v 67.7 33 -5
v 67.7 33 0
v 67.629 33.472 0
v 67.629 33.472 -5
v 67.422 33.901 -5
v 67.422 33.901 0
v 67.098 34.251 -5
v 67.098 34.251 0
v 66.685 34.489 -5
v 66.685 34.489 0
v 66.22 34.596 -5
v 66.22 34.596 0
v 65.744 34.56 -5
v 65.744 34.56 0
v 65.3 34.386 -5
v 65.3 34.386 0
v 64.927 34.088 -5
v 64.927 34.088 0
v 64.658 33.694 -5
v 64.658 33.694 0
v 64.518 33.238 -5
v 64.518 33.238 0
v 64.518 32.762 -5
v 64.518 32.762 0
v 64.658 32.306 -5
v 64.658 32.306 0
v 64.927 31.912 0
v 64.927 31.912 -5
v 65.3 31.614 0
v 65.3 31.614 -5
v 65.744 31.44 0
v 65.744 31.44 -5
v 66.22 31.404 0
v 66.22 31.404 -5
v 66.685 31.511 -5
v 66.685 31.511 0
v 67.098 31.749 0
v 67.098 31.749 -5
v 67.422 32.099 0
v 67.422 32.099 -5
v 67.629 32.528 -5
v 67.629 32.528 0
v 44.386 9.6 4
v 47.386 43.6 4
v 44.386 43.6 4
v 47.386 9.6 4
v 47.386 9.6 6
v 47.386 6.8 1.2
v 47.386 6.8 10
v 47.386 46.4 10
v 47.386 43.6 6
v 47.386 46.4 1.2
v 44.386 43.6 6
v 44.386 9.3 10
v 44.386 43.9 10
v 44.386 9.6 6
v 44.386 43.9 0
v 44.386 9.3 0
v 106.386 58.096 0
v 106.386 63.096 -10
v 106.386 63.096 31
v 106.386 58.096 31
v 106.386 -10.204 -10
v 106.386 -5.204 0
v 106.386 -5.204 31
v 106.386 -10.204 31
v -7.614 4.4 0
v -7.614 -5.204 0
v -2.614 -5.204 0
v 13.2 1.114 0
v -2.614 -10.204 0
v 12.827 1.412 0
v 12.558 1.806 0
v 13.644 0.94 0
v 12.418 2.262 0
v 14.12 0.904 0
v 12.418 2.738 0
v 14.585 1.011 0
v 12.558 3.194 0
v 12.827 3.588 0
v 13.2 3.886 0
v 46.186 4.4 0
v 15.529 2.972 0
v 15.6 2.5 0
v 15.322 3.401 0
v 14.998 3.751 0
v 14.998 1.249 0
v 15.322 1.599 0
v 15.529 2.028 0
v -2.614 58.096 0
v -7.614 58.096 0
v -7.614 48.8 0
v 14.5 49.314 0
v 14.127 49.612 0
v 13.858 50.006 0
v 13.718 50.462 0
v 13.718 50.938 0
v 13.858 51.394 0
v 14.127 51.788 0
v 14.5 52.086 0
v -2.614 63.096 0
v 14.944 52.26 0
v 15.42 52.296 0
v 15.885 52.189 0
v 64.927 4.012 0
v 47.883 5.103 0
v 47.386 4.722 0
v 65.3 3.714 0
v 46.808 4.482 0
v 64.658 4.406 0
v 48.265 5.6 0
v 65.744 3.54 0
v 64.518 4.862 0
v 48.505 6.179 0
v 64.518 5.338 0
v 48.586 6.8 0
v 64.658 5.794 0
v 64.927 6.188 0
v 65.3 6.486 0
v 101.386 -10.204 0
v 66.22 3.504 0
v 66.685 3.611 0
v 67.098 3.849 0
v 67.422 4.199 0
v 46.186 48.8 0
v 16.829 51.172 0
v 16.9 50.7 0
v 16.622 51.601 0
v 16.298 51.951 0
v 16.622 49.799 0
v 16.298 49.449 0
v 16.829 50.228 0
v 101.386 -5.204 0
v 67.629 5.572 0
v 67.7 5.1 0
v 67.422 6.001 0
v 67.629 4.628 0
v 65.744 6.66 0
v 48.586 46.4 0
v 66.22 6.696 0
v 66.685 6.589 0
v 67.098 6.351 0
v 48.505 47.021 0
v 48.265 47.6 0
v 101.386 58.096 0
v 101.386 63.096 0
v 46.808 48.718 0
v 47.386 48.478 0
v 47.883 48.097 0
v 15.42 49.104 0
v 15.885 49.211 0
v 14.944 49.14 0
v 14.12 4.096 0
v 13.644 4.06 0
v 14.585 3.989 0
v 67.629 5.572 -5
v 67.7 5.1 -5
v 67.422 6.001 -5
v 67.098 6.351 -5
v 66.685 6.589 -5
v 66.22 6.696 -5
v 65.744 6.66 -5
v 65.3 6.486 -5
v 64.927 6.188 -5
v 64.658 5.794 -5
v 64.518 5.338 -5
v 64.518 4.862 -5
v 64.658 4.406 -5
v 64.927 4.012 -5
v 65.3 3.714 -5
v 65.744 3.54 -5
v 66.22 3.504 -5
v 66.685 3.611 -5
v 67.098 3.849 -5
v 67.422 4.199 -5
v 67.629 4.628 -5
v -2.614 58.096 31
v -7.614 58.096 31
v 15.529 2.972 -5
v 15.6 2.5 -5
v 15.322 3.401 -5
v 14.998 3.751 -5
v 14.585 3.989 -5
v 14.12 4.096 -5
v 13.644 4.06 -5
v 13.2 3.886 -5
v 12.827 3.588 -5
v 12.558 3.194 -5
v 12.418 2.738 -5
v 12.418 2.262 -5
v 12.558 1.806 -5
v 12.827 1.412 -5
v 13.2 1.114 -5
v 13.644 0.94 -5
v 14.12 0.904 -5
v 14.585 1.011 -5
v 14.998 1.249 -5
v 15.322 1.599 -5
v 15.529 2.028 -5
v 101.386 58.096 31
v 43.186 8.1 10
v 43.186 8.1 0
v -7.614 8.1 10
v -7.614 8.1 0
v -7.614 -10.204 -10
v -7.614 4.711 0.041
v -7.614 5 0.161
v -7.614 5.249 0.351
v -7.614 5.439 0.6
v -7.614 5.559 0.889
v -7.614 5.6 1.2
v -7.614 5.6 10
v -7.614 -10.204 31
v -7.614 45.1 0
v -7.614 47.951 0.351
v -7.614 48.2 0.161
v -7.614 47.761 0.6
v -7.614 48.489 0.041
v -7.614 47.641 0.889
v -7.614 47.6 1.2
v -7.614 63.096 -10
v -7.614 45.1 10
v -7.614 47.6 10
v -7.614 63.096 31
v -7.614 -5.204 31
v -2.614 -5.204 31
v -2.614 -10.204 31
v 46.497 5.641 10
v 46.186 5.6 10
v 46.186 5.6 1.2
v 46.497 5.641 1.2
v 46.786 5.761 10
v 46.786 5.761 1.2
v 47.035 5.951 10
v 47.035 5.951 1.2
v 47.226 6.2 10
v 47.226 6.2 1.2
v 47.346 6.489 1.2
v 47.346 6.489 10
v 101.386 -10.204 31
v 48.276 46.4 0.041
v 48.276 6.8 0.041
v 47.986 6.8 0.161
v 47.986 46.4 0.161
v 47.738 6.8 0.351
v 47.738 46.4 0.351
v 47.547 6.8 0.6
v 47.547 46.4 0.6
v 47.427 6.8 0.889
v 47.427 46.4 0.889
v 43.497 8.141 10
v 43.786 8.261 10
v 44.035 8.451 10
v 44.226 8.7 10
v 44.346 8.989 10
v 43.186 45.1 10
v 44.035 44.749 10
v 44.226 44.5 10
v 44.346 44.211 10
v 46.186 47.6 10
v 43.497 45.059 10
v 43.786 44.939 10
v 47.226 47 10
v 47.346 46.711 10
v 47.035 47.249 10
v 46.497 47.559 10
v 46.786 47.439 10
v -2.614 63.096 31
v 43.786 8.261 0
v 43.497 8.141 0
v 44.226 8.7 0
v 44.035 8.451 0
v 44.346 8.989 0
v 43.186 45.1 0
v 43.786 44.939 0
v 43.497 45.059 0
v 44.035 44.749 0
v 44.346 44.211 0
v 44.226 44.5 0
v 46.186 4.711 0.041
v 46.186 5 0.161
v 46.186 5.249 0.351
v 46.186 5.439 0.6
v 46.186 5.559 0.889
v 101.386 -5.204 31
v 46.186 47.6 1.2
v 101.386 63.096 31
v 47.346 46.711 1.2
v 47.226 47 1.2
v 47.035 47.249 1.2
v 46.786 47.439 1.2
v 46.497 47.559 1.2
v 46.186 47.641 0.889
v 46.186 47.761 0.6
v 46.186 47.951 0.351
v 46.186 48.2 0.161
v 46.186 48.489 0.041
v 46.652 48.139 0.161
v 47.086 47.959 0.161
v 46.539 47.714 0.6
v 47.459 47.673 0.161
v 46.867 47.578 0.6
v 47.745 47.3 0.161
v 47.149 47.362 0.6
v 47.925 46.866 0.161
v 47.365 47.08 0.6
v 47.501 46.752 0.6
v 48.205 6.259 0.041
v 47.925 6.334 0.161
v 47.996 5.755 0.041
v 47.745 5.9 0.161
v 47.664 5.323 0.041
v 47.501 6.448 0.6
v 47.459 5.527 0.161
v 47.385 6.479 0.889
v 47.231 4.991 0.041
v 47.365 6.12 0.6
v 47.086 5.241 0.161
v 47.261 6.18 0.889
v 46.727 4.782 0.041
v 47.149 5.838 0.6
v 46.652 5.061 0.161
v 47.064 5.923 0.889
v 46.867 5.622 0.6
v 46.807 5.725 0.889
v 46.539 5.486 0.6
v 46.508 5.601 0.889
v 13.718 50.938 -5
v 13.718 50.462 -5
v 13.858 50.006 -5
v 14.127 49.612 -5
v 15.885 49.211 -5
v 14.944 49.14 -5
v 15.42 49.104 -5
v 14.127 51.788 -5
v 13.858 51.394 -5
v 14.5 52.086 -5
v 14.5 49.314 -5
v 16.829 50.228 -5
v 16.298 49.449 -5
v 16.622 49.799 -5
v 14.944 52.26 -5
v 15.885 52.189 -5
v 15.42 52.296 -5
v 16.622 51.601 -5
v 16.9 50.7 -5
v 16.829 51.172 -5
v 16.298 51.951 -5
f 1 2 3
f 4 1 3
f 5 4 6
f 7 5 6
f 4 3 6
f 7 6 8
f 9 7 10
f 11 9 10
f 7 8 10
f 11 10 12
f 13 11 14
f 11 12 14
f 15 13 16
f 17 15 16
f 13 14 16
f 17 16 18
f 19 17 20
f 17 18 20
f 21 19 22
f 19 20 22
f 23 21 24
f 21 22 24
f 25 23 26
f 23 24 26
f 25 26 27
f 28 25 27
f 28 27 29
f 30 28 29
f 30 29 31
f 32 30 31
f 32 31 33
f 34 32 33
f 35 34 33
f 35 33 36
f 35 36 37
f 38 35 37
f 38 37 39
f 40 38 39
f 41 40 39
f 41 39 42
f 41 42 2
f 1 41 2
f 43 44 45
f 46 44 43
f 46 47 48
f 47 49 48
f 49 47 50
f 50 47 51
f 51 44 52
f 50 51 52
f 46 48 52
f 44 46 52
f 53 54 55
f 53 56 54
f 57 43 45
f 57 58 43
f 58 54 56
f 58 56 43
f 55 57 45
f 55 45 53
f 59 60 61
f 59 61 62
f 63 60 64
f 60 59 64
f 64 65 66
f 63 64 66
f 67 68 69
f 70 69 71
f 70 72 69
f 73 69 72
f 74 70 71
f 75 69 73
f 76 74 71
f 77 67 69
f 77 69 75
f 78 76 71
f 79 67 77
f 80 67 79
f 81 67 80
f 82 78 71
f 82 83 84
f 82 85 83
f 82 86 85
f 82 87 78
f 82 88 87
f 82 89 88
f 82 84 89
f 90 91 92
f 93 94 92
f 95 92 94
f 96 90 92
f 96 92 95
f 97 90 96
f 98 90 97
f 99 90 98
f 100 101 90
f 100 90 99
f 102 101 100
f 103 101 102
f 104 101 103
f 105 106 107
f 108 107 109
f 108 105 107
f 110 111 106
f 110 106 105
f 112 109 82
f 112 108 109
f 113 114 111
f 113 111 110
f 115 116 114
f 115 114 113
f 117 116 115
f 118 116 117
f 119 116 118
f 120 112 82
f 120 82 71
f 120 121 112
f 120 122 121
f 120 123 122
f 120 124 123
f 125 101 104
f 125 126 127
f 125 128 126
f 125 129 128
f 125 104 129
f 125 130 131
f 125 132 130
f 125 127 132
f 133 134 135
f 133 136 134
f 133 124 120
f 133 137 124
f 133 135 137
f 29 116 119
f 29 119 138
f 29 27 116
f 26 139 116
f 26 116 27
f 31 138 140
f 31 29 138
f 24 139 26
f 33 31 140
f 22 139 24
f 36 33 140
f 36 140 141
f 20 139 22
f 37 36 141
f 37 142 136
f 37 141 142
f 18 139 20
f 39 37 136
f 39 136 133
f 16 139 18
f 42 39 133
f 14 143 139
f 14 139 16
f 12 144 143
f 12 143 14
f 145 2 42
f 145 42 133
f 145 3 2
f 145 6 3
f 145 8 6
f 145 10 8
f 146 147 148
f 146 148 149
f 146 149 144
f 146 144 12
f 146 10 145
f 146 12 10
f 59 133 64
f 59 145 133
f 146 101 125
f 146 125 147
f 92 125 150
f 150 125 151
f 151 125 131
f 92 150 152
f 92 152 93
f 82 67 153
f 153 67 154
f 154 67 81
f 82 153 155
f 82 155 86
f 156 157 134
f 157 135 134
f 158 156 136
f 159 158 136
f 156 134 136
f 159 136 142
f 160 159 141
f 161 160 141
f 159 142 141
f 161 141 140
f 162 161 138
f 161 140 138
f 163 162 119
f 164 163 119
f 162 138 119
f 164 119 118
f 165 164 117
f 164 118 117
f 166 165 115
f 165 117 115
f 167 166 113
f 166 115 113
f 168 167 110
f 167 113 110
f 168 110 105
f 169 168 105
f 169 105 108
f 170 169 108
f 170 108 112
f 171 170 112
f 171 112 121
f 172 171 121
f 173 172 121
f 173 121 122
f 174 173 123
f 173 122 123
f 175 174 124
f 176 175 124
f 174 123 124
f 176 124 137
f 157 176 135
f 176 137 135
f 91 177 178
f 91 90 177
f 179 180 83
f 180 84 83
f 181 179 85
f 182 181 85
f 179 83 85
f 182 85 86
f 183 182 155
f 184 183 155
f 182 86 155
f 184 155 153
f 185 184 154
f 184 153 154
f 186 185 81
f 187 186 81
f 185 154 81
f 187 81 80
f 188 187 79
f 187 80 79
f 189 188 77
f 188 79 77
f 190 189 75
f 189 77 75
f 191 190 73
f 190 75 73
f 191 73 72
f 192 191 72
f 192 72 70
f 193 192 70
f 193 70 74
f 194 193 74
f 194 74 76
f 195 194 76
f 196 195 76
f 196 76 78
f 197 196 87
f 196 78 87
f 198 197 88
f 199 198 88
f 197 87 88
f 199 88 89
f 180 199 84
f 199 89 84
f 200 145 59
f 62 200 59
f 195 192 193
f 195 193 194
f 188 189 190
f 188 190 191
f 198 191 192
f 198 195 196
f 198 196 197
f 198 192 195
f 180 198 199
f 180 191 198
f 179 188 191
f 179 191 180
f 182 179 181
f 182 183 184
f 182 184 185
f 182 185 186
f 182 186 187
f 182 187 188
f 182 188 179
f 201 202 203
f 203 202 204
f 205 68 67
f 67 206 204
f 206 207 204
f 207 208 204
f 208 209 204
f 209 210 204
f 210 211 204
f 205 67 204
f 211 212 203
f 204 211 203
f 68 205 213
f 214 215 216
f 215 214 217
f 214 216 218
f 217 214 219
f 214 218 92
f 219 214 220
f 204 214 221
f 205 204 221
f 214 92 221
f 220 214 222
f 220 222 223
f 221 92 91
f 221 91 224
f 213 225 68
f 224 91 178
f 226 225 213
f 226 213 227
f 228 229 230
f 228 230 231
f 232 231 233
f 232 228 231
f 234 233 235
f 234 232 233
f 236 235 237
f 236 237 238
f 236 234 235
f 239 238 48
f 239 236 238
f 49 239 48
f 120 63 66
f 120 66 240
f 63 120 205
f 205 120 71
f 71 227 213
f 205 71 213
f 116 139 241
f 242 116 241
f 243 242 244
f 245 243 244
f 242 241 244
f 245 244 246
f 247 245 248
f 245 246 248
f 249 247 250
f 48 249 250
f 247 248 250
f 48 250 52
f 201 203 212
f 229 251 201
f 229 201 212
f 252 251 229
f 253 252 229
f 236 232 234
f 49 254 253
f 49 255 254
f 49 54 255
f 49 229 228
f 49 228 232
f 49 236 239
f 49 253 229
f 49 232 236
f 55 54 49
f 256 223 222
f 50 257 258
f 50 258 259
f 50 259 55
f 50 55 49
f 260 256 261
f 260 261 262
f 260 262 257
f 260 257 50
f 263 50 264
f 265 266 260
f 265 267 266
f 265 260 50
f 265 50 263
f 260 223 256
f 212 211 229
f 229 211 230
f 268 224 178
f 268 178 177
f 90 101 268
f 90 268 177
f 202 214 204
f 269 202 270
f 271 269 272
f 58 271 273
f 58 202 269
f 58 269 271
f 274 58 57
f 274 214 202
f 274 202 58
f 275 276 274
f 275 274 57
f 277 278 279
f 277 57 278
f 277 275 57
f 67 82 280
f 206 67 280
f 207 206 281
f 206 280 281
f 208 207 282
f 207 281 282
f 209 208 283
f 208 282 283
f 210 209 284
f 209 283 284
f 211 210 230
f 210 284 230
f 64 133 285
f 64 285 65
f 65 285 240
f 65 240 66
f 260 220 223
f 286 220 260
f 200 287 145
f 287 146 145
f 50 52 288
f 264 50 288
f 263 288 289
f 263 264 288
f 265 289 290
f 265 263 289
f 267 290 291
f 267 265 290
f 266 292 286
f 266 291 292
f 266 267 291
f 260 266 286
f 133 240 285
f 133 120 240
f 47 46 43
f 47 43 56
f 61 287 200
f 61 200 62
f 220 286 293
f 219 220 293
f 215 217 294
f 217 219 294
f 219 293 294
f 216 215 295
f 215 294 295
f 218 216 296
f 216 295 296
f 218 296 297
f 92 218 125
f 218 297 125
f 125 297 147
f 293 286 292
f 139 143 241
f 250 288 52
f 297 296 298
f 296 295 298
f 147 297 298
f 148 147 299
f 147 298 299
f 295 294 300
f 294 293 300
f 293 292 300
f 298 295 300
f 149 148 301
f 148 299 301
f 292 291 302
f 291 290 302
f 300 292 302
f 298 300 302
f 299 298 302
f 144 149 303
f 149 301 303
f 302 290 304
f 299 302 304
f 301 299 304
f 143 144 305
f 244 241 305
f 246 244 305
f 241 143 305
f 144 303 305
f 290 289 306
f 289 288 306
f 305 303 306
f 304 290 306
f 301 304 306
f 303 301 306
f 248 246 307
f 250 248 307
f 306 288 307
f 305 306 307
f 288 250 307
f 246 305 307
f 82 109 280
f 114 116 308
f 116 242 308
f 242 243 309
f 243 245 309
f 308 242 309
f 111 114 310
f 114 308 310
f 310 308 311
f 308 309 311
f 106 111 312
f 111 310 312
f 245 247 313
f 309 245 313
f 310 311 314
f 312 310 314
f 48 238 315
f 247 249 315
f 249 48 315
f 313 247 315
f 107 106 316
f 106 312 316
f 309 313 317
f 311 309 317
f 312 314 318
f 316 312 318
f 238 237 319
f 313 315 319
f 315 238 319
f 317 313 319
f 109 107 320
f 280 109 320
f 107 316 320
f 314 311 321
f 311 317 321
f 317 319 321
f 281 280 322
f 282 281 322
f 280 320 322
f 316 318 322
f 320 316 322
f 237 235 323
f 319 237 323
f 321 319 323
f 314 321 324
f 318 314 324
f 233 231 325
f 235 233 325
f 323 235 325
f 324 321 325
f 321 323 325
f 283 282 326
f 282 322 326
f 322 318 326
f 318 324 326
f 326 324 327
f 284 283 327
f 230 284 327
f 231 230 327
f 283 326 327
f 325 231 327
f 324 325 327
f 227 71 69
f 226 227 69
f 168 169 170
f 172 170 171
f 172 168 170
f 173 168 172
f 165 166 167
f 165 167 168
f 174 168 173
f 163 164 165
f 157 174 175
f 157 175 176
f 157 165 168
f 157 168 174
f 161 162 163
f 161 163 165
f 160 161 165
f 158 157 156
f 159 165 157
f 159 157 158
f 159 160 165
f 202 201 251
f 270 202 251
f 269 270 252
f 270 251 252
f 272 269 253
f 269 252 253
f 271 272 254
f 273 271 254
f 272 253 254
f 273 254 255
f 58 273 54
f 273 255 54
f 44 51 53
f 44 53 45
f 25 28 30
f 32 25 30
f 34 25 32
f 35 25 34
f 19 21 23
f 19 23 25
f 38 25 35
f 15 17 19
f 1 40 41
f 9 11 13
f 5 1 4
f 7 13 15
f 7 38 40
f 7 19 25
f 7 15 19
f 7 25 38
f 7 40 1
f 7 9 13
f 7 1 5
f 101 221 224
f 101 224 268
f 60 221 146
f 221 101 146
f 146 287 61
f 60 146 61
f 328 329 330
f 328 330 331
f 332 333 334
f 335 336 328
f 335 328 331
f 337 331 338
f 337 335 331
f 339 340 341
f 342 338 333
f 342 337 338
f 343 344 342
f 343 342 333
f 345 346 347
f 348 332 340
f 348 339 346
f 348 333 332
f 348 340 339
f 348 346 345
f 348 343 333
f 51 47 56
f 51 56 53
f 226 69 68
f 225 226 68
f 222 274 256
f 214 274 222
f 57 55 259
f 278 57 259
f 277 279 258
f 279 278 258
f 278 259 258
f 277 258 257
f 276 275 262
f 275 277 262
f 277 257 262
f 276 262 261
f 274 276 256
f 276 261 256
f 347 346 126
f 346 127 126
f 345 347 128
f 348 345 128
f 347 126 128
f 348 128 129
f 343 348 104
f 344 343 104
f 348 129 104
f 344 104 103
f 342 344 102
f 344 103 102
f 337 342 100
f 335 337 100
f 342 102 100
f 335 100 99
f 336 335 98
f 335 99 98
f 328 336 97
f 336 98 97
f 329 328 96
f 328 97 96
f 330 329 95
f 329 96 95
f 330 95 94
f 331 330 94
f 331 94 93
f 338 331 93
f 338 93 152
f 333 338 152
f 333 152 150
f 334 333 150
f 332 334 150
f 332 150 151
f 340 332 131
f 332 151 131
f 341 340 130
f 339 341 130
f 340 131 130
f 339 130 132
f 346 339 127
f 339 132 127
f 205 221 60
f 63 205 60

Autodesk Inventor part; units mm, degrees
ref_plane "YZ Plane" through (0, 0, 0) normal (1, 0, 0) x (0, 1, 0)
ref_plane "XZ Plane" through (0, 0, 0) normal (0, 1, 0) x (-1, 0, 0)
ref_plane "XY Plane" through (0, 0, 0) normal (0, 0, 1) x (1, 0, 0)
sketch "Arduino Uno" plane through (0, 0, 0) normal (0, 0, 1) x (1, 0, 0)
  line L0 (0, 0) -> (68.6, 0)
  line L1 (68.6, 0) -> (68.6, 53.3)
  line L2 (68.6, 53.3) -> (0, 53.3)
  line L3 (0, 53.3) -> (0, 0)
  circle A0 centre (14, 2.5) radius 1.6
  circle A1 centre (15.3, 50.7) radius 1.6
  circle A2 centre (66.1, 5.1) radius 1.6
  circle A3 centre (66.1, 33) radius 1.6
  dimension "d6" = 68.6
  dimension "d7" = 53.3
  dimension "d8" = 3.2
  dimension "d12" = 14
  dimension "d13" = 2.5
  dimension "d14" = 3.2
  dimension "d15" = 1.3
  dimension "d16" = 3.2
  dimension "d18" = 2.5
  dimension "d19" = 5.1
  dimension "d20" = 3.2
  dimension "d21" = 27.9
  dimension "d22" = 2.5
  dimension "d26" = 2.6
sketch "Sketch2" plane through (0, 0, 0) normal (0, 0, 1) x (1, 0, 0)
  line L0 (-7.6136, -10.2044) -> (-7.6136, 63.0956)
  line L1 (-7.6136, 63.0956) -> (106.3864, 63.0956)
  line L2 (106.3864, 63.0956) -> (106.3864, -10.2044)
  line L3 (106.3864, -10.2044) -> (-7.6136, -10.2044)
  dimension "d29" = 114
  dimension "d39" = 73.3
extrude "Back Plate" add sketch "Sketch2" against normal blind 10
extrude "Uno Mounting Holes" cut sketch "Arduino Uno" against normal blind 5 contours A0 | A1 | A2 | A3
sketch "3.5\" TFT LCD Screen" plane through (0, 0, 0) normal (0, 0, 1) x (1, 0, 0)
  line L0 (88.6005, 0.0003) -> (88.6005, 53.3003)
  line L1 (88.6005, 53.3003) -> (10.6005, 53.3003)
  line L2 (10.6005, 53.3003) -> (10.6005, 0.0003)
  line L3 (10.6005, 0.0003) -> (88.6005, 0.0003)
  circle A0 centre (66.1, 5.1) radius 1.6 projected
  circle A1 centre (14, 2.5) radius 1.6 projected
  circle A2 centre (15.3, 50.7) radius 1.6 projected
  circle A3 centre (66.1, 33) radius 1.6 projected
  line L4 (-7.6136, -10.2044) -> (-7.6136, 63.0956) projected
  line L5 (106.3864, -10.2044) -> (-7.6136, -10.2044) projected
  line L6 (106.3864, 63.0956) -> (106.3864, -10.2044) projected
  line L7 (-7.6136, 63.0956) -> (106.3864, 63.0956) projected
  point P0 (0, 0)
  point P1 (68.6, 0)
  dimension "d35" = 78
  dimension "d36" = 53.3
  dimension "d37" = 78
  dimension "d38" = 53.3
sketch "SD Card Slot" plane through (0, 0, 0) normal (0, 0, 1) x (1, 0, 0)
  line L0 (43.3864, 9.1) -> (-7.6136, 9.1)
  line L1 (-7.6136, 9.1) -> (-7.6136, 44.1)
  line L2 (-7.6136, 44.1) -> (43.3864, 44.1)
  line L3 (43.3864, 44.1) -> (43.3864, 9.1)
  circle A0 centre (14, 2.5) radius 1.6 projected
  line L4 (-7.6136, -10.2044) -> (-7.6136, 63.0956) projected
  circle A1 centre (15.3, 50.7) radius 1.6 projected
  point P0 (0, 0)
  dimension "d41" = 35
  dimension "d42" = 51
  dimension "d44" = 6.6
  dimension "d45" = 0
sketch "Sketch5" plane through (0, 0, 0) normal (0, 0, 1) x (1, 0, 0)
  line L0 (43.3864, 9.1) -> (-7.6136, 9.1) projected
  line L1 (43.3864, 44.1) -> (43.3864, 9.1) projected
  line L2 (-7.6136, 44.1) -> (43.3864, 44.1) projected
  line L3 (-7.6136, 9.1) -> (-7.6136, 44.1) projected
  line L4 (44.3864, 8.1) -> (44.3864, 45.1)
  line L5 (44.3864, 8.1) -> (-7.6136, 8.1)
  line L6 (-7.6136, -10.2044) -> (-7.6136, 63.0956) projected
  line L7 (44.3864, 45.1) -> (-7.6136, 45.1)
  line L8 (-7.6136, 45.1) -> (-7.6136, 47.6)
  line L9 (-7.6136, 47.6) -> (47.3864, 47.6)
  line L10 (-7.6136, 8.1) -> (-7.6136, 5.6)
  line L11 (-7.6136, 5.6) -> (47.3864, 5.6)
  line L12 (47.3864, 5.6) -> (47.3864, 47.6)
  point P0 (0, 0)
  dimension "d47" = 2.5
  dimension "d48" = 55
  dimension "d49" = 2.5
extrude "SD Card Slot Slot" add sketch "Sketch5" along normal blind 10 contours L5 L4 L7 L6 L9 L12 L11
sketch "Sketch6" plane through (47.3864, 5.6, 0) normal (1, 0, 0) x (0, 0, -1)
  line L0 (0, 42) -> (0, 0) projected
  line L1 (0, 42) -> (-10, 42) projected
  line L2 (-10, 0) -> (-10, 42) projected
  line L3 (0, 0) -> (-10, 0) projected
  line L4 (-6, 38) -> (-4, 38)
  line L5 (-4, 38) -> (-4, 4)
  line L6 (-4, 4) -> (-6, 4)
  line L7 (-6, 4) -> (-6, 38)
  point P0 (0, -5.6)
  dimension "d52" = 4
extrude "SD Ribbon Slot" cut sketch "Sketch6" against normal through all contours L4 L5 L6 L7
fillet "1.2mm Fillet" radius 1.2 7 edges at (19.8864, 47.6, 0) (19.8864, 5.6, 0) (47.3864, 26.6, 0) (47.3864, 5.6, 5) (47.3864, 47.6, 5) (44.3864, 45.1, 5) (44.3864, 8.1, 5)
sketch "Sketch7" plane through (0, 0, 0) normal (0, 0, 1) x (1, 0, 0)
  line L0 (106.3864, -10.2044) -> (101.3864, -10.2044)
  line L1 (101.3864, -10.2044) -> (101.3864, -5.2044)
  line L2 (101.3864, -5.2044) -> (106.3864, -5.2044)
  line L3 (106.3864, -5.2044) -> (106.3864, -10.2044)
  line L4 (49.3864, -10.2044) -> (49.3864, 80.0118)
  line L5 (-7.6136, 63.0956) -> (106.3864, 63.0956) projected
  line L6 (106.3864, 26.4456) -> (-34.6963, 26.4456)
  line L7 (-7.6136, -10.2044) -> (-2.6136, -10.2044)
  line L8 (-2.6136, -10.2044) -> (-2.6136, -5.2044)
  line L9 (-2.6136, -5.2044) -> (-7.6136, -5.2044)
  line L10 (-7.6136, -5.2044) -> (-7.6136, -10.2044)
  line L11 (106.3864, 63.0956) -> (101.3864, 63.0956)
  line L12 (101.3864, 63.0956) -> (101.3864, 58.0956)
  line L13 (101.3864, 58.0956) -> (106.3864, 58.0956)
  line L14 (106.3864, 58.0956) -> (106.3864, 63.0956)
  line L15 (-7.6136, 63.0956) -> (-2.6136, 63.0956)
  line L16 (-2.6136, 63.0956) -> (-2.6136, 58.0956)
  line L17 (-2.6136, 58.0956) -> (-7.6136, 58.0956)
  line L18 (-7.6136, 58.0956) -> (-7.6136, 63.0956)
  point P0 (0, 0)
  point P1 (0, 52.8913)
  dimension "d56" = 5
  dimension "d57" = 5
  dimension "d58" = 57
  dimension "d59" = 36.65
extrude "Pillars" add sketch "Sketch7" along normal blind 31
sketch "Sketch8" plane through (0, 0, 31) normal (0, 0, 1) x (1, 0, 0)
  line L0 (101.3864, -10.2044) -> (-2.6136, -10.2044) projected
  line L1 (-7.6136, -5.2044) -> (-2.6136, -5.2044) projected
  line L2 (101.3864, -10.2044) -> (-2.6136, -10.2044)
  line L3 (-2.6136, -10.2044) -> (-2.6136, -5.2044)
  line L4 (-2.6136, -5.2044) -> (101.3864, -5.2044)
  line L5 (101.3864, -5.2044) -> (101.3864, -10.2044)
  line L6 (101.3864, 63.0956) -> (101.3864, 58.0956) projected
  line L7 (106.3864, 63.0956) -> (106.3864, -10.2044) projected
  line L8 (101.3864, 58.0956) -> (106.3864, 58.0956)
  line L9 (106.3864, 58.0956) -> (106.3864, -5.2044)
  line L10 (106.3864, -5.2044) -> (101.3864, -5.2044)
  line L11 (101.3864, -5.2044) -> (101.3864, 58.0956)
  line L12 (-7.6136, 58.0956) -> (-2.6136, 58.0956) projected
  line L13 (-7.6136, 63.0956) -> (106.3864, 63.0956) projected
  line L14 (-2.6136, 58.0956) -> (101.3864, 58.0956)
  line L15 (101.3864, 58.0956) -> (101.3864, 63.0956)
  line L16 (101.3864, 63.0956) -> (-2.6136, 63.0956)
  line L17 (-2.6136, 63.0956) -> (-2.6136, 58.0956)
  line L18 (-2.6136, 58.0956) -> (-7.6136, 58.0956)
  line L19 (-7.6136, 58.0956) -> (-7.6136, -5.2044)
  line L20 (-7.6136, -5.2044) -> (-2.6136, -5.2044)
  line L21 (-2.6136, -5.2044) -> (-2.6136, 58.0956)
  point P0 (0, 0)
extrude "Beams (Will they print?)" [suppressed]
properties part number "Back Plate test03"
